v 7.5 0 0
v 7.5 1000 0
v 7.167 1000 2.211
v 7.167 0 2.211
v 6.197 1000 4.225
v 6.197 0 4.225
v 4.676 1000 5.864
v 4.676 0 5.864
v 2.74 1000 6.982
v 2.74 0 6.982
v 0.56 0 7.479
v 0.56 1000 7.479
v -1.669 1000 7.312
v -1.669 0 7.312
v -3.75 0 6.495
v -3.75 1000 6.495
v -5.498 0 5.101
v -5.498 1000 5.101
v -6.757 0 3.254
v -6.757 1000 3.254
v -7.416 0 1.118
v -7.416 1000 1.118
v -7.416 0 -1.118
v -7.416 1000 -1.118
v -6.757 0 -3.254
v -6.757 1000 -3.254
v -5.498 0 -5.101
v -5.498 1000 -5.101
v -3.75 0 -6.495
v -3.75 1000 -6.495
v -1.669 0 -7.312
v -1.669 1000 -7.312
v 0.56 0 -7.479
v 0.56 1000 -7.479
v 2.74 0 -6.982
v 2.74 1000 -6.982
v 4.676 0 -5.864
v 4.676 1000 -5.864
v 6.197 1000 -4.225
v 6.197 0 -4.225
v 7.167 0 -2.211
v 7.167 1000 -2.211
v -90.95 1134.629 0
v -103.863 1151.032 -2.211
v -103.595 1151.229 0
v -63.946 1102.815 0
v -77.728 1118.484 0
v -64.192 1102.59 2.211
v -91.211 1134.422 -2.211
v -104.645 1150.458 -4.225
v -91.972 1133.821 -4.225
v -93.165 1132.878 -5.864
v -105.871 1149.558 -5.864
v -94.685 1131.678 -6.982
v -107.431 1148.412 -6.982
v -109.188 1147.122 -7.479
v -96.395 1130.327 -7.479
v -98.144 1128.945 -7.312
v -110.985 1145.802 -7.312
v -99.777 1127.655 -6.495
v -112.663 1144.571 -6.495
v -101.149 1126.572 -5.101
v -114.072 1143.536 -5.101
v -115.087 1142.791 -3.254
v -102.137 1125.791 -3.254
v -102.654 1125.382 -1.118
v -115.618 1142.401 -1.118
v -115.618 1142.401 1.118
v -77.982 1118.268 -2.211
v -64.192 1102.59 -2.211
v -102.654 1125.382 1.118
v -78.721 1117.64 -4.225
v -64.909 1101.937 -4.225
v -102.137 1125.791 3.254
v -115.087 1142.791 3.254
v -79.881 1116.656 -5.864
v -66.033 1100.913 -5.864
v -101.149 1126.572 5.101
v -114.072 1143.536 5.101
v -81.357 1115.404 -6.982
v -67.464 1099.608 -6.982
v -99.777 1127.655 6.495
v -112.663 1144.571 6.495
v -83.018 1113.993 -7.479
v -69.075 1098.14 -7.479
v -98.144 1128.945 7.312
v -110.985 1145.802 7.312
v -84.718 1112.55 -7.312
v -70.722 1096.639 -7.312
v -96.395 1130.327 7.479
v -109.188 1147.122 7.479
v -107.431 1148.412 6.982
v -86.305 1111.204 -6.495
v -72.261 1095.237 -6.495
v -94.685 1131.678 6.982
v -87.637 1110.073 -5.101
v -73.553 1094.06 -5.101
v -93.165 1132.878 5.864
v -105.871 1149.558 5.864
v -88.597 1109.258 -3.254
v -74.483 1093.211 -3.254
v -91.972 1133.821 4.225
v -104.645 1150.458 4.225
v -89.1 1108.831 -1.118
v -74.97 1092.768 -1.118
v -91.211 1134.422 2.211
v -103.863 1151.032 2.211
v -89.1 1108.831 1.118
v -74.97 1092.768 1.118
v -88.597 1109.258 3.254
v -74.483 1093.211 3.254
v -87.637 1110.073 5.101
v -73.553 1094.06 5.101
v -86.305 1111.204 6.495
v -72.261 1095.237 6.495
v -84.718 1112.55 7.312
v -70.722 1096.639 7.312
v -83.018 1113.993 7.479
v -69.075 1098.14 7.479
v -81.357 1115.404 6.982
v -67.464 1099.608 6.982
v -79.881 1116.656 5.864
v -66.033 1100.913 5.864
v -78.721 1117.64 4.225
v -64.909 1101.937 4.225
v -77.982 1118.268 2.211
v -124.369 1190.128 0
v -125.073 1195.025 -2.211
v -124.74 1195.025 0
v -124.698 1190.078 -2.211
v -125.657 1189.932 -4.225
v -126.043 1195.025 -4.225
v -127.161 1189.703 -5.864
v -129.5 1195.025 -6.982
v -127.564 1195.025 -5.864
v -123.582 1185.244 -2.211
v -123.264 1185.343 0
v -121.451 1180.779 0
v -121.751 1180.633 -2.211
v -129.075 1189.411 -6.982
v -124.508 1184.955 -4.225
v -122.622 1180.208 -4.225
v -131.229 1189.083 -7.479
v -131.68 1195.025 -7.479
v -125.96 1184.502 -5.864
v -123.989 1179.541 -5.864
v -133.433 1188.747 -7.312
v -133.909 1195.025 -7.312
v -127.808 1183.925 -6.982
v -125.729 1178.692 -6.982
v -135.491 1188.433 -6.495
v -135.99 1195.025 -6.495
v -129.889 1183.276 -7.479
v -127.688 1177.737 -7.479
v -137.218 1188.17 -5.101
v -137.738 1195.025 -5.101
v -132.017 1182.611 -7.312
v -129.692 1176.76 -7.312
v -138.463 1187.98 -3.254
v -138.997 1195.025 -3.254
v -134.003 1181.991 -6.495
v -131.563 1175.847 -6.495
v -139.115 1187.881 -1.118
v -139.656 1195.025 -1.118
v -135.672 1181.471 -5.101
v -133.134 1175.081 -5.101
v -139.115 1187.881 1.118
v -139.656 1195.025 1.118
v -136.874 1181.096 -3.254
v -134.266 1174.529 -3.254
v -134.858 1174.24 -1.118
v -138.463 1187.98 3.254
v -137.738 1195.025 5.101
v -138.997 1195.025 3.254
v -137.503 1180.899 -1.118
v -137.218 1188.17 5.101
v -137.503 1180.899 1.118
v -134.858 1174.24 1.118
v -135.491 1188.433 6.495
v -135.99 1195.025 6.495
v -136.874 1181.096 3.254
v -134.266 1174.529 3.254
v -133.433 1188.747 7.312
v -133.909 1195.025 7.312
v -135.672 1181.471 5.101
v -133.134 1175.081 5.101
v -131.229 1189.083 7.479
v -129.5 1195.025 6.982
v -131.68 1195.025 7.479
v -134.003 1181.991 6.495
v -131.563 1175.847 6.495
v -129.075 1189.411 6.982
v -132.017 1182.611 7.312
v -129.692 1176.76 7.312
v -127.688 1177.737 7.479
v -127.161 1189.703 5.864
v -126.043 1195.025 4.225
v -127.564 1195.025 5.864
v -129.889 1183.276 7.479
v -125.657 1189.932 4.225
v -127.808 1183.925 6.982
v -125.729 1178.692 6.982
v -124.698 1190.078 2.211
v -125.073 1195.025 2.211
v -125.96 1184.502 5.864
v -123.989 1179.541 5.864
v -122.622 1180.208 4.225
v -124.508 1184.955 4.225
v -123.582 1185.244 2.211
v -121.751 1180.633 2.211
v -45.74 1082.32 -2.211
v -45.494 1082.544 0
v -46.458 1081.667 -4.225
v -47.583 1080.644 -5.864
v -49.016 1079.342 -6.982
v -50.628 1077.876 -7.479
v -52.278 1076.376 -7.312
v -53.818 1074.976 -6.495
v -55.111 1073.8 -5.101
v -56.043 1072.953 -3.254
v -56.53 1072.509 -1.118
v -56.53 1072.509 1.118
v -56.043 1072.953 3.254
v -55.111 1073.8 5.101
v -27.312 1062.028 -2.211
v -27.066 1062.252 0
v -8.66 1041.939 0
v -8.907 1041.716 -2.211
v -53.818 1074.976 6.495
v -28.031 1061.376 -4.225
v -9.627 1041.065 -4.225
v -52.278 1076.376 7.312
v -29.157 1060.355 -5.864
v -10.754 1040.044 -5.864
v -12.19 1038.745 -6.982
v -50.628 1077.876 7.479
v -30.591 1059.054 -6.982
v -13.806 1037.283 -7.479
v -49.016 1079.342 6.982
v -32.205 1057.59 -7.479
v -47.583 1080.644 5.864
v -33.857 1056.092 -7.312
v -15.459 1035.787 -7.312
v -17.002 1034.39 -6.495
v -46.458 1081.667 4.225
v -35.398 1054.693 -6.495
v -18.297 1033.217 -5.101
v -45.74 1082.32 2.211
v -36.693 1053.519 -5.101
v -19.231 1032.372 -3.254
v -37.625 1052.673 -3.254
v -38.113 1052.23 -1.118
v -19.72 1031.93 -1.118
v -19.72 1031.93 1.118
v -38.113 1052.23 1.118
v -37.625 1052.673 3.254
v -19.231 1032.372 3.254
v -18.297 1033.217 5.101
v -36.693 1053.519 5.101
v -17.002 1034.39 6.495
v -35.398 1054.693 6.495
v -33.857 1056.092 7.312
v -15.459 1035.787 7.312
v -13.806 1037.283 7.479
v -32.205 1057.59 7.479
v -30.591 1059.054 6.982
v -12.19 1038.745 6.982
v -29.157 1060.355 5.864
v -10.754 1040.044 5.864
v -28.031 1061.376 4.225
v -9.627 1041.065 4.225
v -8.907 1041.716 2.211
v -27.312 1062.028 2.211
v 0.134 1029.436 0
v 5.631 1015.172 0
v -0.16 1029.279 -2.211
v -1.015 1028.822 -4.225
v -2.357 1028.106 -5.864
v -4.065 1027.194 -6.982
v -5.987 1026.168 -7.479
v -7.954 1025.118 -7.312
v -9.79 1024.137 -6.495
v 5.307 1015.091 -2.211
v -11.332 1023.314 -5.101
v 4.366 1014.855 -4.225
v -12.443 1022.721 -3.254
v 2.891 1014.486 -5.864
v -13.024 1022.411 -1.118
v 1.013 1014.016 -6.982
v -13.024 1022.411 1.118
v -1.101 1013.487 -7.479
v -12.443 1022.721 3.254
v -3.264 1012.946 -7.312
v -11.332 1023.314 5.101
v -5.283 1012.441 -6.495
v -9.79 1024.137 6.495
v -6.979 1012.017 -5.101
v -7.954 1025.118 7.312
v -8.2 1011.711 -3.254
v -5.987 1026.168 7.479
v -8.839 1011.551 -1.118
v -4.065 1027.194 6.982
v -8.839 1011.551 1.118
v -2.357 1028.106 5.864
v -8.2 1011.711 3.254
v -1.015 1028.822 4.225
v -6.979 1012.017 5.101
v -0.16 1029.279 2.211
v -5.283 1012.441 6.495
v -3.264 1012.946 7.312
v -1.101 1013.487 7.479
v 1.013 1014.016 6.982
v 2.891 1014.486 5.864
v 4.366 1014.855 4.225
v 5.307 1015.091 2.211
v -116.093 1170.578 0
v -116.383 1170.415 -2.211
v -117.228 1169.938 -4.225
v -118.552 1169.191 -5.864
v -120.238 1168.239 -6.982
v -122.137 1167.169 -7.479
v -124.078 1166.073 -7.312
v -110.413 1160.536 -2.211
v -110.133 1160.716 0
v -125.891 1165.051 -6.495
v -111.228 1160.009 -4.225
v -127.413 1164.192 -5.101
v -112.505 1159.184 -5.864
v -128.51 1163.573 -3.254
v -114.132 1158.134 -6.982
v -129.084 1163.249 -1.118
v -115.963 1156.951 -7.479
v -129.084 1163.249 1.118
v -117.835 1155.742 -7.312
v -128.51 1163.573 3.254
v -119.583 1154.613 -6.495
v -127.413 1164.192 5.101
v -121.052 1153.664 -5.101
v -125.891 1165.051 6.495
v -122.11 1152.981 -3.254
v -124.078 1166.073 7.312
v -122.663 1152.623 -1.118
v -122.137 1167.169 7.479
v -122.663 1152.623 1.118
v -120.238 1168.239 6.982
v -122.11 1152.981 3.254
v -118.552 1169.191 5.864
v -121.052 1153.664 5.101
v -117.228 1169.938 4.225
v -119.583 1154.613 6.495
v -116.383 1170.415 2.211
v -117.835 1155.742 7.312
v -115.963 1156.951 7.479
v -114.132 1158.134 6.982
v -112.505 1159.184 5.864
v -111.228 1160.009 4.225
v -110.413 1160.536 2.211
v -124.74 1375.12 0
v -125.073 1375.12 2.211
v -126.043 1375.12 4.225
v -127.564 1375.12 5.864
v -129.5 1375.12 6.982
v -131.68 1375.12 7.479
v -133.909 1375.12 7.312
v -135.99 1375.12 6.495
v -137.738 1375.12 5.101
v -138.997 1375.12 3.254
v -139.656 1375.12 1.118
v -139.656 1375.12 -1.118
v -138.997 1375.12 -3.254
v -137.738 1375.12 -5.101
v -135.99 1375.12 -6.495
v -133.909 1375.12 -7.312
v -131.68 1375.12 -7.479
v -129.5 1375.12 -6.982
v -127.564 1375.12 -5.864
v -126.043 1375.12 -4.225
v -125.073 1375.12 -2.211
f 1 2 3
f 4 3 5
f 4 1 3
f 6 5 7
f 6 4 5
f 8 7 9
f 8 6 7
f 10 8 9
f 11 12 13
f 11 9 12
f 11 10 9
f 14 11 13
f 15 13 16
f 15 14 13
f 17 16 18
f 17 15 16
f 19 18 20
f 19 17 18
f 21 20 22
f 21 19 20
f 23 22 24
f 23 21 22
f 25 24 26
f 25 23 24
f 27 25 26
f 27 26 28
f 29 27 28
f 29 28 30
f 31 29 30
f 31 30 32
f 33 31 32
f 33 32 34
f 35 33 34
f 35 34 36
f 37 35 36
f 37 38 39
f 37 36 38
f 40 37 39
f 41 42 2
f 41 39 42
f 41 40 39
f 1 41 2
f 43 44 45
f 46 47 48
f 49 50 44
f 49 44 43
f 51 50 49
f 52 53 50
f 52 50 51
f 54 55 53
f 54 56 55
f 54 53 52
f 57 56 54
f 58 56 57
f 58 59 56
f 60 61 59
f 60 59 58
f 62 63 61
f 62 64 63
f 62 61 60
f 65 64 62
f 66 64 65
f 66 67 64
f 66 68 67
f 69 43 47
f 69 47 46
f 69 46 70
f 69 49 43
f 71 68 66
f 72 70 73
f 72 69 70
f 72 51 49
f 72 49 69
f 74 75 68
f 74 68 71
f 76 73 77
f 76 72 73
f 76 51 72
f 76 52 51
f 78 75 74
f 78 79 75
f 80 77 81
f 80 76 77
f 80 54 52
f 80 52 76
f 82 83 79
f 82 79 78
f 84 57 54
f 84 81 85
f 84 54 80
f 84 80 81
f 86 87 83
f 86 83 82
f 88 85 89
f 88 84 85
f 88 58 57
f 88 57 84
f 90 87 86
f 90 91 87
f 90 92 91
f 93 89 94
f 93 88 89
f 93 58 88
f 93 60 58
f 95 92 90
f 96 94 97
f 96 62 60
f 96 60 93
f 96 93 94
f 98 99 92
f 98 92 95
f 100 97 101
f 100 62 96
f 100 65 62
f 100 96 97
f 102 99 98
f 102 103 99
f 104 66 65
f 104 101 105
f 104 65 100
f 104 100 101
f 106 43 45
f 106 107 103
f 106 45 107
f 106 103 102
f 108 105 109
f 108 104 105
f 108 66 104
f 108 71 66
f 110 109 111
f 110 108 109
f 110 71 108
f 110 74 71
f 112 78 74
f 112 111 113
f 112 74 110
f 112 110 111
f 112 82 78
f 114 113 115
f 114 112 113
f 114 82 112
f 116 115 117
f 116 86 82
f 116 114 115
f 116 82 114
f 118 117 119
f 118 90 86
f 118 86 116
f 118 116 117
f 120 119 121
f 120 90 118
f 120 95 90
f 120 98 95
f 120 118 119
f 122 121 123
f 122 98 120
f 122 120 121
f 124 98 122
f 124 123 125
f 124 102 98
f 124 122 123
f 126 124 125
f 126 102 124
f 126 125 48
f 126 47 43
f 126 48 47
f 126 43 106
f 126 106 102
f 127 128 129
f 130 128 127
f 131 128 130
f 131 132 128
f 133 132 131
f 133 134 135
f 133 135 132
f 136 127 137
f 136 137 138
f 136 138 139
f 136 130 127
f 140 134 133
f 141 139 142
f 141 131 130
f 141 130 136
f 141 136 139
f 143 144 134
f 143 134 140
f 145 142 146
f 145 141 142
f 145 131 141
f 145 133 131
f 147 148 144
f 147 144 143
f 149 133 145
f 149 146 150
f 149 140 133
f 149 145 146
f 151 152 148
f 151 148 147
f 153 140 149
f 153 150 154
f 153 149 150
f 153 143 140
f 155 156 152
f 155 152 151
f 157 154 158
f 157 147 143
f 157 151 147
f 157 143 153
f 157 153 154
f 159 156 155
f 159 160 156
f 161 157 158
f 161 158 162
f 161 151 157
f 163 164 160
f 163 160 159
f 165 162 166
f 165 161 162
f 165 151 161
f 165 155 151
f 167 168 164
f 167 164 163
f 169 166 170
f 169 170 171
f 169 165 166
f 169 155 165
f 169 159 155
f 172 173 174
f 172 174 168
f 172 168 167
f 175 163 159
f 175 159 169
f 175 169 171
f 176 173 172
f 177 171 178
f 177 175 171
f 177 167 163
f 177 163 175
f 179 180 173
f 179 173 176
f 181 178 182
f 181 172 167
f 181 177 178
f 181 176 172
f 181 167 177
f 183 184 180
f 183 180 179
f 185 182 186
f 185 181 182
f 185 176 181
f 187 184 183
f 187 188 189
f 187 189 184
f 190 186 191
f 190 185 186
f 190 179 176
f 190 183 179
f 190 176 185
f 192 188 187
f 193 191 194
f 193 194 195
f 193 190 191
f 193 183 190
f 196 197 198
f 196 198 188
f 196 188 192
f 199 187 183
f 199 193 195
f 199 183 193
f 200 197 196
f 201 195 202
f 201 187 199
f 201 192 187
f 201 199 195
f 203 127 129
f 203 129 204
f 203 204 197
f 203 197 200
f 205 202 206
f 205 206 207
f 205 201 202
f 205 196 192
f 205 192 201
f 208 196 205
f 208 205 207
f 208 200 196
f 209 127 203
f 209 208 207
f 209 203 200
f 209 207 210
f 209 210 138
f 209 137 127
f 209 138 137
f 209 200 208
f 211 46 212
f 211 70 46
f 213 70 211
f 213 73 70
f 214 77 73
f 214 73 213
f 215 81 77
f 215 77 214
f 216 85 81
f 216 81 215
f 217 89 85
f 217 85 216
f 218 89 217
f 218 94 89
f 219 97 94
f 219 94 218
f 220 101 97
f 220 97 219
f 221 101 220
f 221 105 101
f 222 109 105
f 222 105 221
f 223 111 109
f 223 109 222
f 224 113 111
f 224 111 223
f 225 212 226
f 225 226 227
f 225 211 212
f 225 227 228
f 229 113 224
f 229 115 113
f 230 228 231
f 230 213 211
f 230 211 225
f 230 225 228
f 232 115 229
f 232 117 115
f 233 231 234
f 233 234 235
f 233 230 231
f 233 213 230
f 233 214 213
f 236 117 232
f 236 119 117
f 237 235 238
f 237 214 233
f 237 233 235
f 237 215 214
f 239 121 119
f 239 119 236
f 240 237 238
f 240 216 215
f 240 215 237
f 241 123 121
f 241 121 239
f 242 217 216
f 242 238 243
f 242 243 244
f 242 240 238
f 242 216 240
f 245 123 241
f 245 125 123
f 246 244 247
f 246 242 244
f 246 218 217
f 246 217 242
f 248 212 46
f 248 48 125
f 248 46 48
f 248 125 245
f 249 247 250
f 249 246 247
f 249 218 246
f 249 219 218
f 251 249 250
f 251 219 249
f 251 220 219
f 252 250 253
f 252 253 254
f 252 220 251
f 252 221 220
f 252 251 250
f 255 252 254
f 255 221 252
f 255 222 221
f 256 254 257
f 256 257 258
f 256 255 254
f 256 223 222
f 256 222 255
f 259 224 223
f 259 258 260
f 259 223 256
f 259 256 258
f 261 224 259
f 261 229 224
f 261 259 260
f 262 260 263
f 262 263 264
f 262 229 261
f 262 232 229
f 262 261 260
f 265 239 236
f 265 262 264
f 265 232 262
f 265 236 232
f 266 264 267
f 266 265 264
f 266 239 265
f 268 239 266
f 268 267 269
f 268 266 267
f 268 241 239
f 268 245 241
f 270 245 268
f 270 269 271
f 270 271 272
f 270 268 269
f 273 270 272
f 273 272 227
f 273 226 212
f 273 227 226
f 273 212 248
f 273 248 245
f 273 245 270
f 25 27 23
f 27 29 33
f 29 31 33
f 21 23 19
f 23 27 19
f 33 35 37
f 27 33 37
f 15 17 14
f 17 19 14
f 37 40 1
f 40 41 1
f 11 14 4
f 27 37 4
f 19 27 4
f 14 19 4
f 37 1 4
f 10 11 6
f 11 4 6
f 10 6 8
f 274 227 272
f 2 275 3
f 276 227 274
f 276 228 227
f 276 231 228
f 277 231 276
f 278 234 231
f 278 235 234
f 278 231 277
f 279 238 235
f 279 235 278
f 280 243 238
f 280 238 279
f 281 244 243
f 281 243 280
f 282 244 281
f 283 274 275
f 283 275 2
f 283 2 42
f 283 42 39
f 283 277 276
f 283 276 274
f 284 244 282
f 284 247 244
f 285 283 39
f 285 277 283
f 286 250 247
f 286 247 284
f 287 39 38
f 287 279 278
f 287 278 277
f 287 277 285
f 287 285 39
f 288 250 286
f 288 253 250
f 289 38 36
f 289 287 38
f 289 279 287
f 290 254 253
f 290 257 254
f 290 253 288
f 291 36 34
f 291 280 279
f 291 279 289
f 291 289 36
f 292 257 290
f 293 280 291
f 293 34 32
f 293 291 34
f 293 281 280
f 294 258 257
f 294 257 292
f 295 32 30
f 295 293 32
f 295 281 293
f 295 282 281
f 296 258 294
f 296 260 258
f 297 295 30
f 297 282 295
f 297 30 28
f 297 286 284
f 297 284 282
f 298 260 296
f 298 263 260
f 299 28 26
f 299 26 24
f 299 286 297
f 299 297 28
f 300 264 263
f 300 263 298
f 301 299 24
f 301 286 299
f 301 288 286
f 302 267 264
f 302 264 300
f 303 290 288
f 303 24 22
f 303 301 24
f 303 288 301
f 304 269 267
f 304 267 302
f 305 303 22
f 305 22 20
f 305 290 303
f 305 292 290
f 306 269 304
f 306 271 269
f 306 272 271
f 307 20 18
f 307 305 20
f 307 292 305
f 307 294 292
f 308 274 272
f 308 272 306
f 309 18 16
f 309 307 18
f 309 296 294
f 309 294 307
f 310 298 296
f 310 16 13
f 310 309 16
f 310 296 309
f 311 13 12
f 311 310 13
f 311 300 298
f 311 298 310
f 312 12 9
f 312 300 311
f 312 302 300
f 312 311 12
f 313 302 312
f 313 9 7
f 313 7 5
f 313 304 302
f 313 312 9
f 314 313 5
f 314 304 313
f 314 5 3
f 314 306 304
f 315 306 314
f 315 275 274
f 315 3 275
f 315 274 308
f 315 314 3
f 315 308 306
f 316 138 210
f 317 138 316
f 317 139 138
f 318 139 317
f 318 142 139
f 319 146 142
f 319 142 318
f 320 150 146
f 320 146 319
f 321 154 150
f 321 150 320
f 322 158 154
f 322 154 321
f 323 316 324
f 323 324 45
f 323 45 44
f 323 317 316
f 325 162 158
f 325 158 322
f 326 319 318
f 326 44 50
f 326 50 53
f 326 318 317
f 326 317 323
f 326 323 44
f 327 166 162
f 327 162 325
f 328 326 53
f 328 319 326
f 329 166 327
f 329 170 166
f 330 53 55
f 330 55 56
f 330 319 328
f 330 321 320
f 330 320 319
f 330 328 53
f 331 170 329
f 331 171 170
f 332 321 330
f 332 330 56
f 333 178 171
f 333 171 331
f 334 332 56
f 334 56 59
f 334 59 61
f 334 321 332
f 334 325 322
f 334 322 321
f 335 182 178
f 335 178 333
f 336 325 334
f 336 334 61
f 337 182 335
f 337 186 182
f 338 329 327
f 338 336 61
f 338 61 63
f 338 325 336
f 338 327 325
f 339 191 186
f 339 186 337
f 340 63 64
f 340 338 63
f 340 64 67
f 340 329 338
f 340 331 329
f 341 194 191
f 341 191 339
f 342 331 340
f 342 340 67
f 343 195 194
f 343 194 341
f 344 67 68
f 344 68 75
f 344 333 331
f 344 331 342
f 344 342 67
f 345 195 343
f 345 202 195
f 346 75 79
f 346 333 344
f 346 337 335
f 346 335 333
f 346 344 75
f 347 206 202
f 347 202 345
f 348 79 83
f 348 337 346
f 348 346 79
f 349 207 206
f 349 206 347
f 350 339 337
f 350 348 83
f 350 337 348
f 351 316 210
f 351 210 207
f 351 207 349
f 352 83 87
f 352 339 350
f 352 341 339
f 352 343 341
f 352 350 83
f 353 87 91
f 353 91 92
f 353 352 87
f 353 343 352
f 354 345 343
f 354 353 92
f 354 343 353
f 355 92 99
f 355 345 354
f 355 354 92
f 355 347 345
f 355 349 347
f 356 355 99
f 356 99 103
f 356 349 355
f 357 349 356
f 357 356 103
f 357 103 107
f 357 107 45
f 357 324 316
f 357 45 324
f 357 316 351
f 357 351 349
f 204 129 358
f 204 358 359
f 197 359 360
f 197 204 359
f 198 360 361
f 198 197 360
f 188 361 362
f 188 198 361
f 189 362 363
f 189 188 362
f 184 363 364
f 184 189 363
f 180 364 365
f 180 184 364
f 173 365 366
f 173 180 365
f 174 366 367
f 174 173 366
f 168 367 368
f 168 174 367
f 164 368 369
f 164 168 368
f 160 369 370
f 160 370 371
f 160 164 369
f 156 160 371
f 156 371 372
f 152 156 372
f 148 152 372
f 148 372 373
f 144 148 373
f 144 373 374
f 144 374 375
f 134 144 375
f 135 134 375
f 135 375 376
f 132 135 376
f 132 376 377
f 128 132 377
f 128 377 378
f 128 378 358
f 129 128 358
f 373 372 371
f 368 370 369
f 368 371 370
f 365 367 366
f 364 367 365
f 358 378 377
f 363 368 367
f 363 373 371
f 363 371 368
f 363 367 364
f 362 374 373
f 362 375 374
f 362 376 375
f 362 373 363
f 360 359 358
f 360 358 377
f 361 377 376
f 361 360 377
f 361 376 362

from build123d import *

# Parameters (mm, degrees)
SKETCH_2_R = 7.5


with BuildPart() as part:
    # 扫描1: sweep along a path in 草图1
    with BuildLine(Plane.XY) as sweep_1_path:
        Line((-132.24, 1375.12), (-132.24, 1195.025238859))
        ThreePointArc((-132.24, 1195.025238859), (-131.214906225, 1186.027645585), (-128.192165763, 1177.491221153))
        ThreePointArc((-128.192165763, 1177.491221153), (-119.60577967, 1161.723839886), (-109.64, 1146.79))
        ThreePointArc((-109.64, 1146.79), (-90.212182039, 1121.745991014), (-69.488938494, 1097.76287875))
        ThreePointArc((-69.488938494, 1097.76287875), (-41.828906751, 1067.358377322), (-14.221130337, 1036.906419346))
        ThreePointArc((-14.221130337, 1036.906419346), (-3.678280273, 1019.775770131), (0, 1000))
        Line((0, 1000), (0, 0))
    # 草图2 → 扫描1 (sweep)
    with BuildSketch(Plane(origin=(0, 0, 0), x_dir=(1, 0, 0), z_dir=(0, 1, 0))):
        Circle(SKETCH_2_R)
    sweep(path=sweep_1_path.line)


solid = part.part
